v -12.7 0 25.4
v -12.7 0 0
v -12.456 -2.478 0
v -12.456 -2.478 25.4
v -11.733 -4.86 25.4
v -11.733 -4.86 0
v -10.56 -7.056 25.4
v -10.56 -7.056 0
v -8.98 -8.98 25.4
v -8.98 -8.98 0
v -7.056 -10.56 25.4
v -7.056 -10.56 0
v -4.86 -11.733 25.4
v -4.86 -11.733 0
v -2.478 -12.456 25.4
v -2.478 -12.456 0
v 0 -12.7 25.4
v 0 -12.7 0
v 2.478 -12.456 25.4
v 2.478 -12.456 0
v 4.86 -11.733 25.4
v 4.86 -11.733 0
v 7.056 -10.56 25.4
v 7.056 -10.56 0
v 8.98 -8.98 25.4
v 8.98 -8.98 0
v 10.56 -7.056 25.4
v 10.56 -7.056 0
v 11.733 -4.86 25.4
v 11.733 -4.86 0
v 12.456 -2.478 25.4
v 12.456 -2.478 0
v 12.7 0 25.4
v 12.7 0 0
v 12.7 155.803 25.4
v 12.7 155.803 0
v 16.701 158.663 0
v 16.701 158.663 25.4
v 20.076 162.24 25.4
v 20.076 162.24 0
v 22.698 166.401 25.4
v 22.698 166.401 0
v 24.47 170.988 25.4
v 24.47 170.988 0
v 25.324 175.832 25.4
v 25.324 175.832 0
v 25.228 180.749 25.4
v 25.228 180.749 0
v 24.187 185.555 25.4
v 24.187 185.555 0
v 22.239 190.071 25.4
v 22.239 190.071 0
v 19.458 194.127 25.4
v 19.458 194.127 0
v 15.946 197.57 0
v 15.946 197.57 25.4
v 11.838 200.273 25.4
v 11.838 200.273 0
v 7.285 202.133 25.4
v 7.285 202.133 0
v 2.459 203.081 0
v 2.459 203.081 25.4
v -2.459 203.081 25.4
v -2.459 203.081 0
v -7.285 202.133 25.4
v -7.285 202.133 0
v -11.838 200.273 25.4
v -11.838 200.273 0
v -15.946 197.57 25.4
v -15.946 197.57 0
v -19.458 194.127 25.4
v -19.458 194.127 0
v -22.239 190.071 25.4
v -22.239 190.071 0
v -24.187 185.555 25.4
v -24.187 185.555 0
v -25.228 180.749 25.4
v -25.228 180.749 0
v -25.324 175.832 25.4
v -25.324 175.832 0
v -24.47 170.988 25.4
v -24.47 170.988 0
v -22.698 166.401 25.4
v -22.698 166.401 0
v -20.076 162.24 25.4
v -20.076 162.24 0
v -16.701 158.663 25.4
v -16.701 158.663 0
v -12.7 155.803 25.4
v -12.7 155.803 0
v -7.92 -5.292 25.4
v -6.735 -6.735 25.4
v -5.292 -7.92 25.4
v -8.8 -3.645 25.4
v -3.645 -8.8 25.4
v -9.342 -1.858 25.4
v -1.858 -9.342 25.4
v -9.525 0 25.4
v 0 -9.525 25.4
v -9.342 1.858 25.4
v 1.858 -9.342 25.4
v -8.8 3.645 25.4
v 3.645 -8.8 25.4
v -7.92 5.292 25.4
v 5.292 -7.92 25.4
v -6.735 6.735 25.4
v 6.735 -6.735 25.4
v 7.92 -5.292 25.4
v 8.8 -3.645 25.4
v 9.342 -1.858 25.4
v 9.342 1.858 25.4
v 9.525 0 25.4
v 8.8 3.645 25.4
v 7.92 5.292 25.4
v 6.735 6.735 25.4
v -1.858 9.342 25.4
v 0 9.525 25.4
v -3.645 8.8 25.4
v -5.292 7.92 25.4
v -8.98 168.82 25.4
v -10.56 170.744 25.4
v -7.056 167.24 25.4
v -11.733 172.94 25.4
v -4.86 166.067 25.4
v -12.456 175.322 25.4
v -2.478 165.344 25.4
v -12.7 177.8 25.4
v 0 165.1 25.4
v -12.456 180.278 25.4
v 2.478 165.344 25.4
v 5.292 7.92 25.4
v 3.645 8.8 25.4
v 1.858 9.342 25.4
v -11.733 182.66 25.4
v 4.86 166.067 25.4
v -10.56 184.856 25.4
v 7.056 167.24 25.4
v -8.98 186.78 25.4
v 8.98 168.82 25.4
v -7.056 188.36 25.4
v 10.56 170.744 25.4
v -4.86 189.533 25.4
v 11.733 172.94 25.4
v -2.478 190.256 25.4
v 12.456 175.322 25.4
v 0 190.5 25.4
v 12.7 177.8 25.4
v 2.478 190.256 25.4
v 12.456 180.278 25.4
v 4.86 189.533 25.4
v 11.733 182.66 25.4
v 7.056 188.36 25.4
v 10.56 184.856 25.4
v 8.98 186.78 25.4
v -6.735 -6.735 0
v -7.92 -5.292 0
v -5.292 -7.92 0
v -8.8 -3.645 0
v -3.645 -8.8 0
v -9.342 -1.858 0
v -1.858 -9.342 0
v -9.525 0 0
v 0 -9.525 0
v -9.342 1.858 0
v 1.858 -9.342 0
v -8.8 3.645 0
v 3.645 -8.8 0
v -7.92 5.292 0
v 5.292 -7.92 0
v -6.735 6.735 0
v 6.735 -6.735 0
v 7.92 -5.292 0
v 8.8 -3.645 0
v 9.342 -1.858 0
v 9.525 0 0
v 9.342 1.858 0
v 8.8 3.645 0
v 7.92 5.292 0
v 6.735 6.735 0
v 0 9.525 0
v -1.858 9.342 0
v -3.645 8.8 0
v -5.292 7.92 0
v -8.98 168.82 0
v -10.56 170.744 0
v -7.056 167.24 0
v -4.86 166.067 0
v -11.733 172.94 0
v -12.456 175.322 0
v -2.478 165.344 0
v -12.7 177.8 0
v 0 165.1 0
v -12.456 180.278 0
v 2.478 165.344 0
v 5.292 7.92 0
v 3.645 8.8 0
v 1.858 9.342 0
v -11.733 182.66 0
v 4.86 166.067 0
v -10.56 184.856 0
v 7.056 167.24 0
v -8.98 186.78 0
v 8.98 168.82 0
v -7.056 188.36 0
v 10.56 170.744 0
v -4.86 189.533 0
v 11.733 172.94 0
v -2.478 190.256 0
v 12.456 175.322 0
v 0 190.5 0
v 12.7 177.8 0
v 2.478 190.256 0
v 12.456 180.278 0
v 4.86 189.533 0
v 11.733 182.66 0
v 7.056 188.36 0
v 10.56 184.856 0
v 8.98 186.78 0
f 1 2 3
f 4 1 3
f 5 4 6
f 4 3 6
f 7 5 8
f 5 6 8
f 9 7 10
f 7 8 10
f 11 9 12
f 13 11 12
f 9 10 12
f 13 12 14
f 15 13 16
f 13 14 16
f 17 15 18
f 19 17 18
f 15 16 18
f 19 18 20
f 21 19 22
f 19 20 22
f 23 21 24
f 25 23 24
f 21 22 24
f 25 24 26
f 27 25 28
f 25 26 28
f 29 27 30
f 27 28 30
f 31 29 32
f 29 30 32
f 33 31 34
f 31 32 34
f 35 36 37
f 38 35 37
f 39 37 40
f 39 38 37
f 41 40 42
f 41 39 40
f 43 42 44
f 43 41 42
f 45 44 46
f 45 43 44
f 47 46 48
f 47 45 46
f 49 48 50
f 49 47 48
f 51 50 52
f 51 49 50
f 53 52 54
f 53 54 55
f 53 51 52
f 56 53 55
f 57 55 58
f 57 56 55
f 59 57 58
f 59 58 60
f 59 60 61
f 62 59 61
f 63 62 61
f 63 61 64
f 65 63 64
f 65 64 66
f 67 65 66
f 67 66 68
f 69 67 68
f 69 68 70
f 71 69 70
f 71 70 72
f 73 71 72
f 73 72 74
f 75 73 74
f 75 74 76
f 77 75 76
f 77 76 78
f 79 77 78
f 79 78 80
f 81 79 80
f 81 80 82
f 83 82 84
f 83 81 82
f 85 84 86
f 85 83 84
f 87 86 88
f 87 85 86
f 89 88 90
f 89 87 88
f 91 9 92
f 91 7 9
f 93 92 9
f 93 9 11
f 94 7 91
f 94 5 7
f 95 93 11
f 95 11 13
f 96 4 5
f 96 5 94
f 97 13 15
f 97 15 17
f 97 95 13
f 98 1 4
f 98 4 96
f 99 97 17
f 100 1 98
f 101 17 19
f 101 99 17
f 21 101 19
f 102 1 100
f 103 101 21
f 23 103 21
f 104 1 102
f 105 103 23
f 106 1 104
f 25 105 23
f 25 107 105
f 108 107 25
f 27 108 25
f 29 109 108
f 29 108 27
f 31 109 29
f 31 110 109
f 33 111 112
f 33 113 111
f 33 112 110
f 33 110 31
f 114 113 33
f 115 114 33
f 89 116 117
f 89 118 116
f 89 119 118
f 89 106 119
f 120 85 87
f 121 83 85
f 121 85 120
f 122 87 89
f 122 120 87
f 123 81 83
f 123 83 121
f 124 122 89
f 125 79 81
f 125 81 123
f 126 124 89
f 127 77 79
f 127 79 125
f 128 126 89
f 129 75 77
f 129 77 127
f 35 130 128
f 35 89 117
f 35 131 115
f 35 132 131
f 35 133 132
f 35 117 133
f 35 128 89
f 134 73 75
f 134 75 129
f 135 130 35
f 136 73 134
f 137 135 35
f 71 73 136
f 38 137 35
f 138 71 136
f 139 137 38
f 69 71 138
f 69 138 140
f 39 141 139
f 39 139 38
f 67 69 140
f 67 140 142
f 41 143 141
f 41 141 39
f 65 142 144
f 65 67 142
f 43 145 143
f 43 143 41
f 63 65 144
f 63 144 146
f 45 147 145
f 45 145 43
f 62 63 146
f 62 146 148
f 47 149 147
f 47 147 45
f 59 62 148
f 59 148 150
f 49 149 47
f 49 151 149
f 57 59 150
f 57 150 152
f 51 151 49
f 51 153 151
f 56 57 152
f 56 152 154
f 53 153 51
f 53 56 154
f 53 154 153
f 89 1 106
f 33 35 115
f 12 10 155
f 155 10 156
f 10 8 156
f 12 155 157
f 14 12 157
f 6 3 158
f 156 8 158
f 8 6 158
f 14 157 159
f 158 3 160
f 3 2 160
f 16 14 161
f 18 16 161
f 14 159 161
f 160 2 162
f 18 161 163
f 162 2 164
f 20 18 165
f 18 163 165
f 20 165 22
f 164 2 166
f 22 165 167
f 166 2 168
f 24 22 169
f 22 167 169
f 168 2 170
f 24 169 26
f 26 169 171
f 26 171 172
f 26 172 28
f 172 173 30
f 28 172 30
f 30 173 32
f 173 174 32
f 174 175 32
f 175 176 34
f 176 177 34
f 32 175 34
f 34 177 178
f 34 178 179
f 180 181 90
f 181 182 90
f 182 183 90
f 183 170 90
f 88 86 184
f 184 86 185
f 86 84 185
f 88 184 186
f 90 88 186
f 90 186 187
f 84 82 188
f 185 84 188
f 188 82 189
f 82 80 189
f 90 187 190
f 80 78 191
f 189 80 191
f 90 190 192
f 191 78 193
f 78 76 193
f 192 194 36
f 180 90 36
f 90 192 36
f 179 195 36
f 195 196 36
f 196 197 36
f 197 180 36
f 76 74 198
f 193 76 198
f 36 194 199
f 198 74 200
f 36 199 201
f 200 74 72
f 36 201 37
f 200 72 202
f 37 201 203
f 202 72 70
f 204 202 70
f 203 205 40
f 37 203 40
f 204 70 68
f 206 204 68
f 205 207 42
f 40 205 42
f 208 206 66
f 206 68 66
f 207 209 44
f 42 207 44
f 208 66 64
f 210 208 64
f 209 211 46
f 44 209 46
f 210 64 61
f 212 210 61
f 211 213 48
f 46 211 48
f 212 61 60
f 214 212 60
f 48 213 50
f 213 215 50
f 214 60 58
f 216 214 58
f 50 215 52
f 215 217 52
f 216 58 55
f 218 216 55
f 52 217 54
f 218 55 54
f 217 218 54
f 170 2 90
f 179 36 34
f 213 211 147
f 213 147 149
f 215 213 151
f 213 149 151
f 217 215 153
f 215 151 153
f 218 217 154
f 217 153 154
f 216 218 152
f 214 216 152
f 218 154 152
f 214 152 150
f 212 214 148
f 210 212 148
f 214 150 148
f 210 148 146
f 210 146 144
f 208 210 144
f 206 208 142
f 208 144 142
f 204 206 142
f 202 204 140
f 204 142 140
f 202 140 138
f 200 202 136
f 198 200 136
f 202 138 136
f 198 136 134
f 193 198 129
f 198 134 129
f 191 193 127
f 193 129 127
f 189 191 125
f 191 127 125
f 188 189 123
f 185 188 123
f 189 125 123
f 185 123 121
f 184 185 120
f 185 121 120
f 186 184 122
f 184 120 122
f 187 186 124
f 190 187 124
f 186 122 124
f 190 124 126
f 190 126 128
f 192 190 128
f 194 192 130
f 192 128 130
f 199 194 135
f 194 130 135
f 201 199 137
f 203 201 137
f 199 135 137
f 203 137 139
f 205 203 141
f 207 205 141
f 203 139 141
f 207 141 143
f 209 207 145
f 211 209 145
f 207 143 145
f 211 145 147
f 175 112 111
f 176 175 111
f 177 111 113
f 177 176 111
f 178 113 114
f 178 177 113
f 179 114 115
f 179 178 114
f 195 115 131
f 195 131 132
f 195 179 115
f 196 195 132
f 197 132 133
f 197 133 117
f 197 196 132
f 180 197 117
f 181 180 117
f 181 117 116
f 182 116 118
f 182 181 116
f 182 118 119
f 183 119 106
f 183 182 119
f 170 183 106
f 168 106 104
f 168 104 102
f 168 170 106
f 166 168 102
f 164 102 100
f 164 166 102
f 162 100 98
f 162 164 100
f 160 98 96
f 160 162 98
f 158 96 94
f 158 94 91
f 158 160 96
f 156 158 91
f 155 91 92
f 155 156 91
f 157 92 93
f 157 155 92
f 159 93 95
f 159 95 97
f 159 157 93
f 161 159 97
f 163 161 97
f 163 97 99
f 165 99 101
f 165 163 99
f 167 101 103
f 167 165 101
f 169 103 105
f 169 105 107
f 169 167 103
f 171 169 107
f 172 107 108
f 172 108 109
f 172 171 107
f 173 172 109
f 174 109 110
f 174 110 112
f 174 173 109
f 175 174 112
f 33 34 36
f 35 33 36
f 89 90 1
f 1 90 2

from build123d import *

# Parameters (mm, degrees)
F0_R     = 9.525
F1_DEPTH = 25.4
F2_R     = 25.4
F3_DEPTH = 25.4
F4_R     = 12.7
F5_DEPTH = 25.4


with BuildPart() as f1:
    # F0 (on Top) → F1 (new body)
    with BuildSketch(Plane.XY):
        with BuildLine():
            ThreePointArc((-12.7, 0), (0, -12.7), (12.7, 0))
            ThreePointArc((12.7, 0), (0, 12.7), (-12.7, 0))
        make_face()
        Circle(F0_R, mode=Mode.SUBTRACT)
        with BuildLine():
            ThreePointArc((-12.7, 0), (0, 12.7), (12.7, 0))
            Line((12.7, 0), (12.7, 177.8))
            Line((12.7, 177.8), (-12.7, 177.8))
            Line((-12.7, 177.8), (-12.7, 0))
        make_face()
    extrude(amount=F1_DEPTH)

    # F2 (on face) → F3 (join)
    with BuildSketch(Plane.XY.offset(25.4)):
        with Locations((0, 177.8)):
            Circle(F2_R)
    extrude(amount=-F3_DEPTH)

    # F4 (on face) → F5 (cut)
    with BuildSketch(Plane.XY.offset(25.4)):
        with Locations((0, 177.8)):
            Circle(F4_R)
    extrude(amount=-F5_DEPTH, mode=Mode.SUBTRACT)


solid = f1.part
